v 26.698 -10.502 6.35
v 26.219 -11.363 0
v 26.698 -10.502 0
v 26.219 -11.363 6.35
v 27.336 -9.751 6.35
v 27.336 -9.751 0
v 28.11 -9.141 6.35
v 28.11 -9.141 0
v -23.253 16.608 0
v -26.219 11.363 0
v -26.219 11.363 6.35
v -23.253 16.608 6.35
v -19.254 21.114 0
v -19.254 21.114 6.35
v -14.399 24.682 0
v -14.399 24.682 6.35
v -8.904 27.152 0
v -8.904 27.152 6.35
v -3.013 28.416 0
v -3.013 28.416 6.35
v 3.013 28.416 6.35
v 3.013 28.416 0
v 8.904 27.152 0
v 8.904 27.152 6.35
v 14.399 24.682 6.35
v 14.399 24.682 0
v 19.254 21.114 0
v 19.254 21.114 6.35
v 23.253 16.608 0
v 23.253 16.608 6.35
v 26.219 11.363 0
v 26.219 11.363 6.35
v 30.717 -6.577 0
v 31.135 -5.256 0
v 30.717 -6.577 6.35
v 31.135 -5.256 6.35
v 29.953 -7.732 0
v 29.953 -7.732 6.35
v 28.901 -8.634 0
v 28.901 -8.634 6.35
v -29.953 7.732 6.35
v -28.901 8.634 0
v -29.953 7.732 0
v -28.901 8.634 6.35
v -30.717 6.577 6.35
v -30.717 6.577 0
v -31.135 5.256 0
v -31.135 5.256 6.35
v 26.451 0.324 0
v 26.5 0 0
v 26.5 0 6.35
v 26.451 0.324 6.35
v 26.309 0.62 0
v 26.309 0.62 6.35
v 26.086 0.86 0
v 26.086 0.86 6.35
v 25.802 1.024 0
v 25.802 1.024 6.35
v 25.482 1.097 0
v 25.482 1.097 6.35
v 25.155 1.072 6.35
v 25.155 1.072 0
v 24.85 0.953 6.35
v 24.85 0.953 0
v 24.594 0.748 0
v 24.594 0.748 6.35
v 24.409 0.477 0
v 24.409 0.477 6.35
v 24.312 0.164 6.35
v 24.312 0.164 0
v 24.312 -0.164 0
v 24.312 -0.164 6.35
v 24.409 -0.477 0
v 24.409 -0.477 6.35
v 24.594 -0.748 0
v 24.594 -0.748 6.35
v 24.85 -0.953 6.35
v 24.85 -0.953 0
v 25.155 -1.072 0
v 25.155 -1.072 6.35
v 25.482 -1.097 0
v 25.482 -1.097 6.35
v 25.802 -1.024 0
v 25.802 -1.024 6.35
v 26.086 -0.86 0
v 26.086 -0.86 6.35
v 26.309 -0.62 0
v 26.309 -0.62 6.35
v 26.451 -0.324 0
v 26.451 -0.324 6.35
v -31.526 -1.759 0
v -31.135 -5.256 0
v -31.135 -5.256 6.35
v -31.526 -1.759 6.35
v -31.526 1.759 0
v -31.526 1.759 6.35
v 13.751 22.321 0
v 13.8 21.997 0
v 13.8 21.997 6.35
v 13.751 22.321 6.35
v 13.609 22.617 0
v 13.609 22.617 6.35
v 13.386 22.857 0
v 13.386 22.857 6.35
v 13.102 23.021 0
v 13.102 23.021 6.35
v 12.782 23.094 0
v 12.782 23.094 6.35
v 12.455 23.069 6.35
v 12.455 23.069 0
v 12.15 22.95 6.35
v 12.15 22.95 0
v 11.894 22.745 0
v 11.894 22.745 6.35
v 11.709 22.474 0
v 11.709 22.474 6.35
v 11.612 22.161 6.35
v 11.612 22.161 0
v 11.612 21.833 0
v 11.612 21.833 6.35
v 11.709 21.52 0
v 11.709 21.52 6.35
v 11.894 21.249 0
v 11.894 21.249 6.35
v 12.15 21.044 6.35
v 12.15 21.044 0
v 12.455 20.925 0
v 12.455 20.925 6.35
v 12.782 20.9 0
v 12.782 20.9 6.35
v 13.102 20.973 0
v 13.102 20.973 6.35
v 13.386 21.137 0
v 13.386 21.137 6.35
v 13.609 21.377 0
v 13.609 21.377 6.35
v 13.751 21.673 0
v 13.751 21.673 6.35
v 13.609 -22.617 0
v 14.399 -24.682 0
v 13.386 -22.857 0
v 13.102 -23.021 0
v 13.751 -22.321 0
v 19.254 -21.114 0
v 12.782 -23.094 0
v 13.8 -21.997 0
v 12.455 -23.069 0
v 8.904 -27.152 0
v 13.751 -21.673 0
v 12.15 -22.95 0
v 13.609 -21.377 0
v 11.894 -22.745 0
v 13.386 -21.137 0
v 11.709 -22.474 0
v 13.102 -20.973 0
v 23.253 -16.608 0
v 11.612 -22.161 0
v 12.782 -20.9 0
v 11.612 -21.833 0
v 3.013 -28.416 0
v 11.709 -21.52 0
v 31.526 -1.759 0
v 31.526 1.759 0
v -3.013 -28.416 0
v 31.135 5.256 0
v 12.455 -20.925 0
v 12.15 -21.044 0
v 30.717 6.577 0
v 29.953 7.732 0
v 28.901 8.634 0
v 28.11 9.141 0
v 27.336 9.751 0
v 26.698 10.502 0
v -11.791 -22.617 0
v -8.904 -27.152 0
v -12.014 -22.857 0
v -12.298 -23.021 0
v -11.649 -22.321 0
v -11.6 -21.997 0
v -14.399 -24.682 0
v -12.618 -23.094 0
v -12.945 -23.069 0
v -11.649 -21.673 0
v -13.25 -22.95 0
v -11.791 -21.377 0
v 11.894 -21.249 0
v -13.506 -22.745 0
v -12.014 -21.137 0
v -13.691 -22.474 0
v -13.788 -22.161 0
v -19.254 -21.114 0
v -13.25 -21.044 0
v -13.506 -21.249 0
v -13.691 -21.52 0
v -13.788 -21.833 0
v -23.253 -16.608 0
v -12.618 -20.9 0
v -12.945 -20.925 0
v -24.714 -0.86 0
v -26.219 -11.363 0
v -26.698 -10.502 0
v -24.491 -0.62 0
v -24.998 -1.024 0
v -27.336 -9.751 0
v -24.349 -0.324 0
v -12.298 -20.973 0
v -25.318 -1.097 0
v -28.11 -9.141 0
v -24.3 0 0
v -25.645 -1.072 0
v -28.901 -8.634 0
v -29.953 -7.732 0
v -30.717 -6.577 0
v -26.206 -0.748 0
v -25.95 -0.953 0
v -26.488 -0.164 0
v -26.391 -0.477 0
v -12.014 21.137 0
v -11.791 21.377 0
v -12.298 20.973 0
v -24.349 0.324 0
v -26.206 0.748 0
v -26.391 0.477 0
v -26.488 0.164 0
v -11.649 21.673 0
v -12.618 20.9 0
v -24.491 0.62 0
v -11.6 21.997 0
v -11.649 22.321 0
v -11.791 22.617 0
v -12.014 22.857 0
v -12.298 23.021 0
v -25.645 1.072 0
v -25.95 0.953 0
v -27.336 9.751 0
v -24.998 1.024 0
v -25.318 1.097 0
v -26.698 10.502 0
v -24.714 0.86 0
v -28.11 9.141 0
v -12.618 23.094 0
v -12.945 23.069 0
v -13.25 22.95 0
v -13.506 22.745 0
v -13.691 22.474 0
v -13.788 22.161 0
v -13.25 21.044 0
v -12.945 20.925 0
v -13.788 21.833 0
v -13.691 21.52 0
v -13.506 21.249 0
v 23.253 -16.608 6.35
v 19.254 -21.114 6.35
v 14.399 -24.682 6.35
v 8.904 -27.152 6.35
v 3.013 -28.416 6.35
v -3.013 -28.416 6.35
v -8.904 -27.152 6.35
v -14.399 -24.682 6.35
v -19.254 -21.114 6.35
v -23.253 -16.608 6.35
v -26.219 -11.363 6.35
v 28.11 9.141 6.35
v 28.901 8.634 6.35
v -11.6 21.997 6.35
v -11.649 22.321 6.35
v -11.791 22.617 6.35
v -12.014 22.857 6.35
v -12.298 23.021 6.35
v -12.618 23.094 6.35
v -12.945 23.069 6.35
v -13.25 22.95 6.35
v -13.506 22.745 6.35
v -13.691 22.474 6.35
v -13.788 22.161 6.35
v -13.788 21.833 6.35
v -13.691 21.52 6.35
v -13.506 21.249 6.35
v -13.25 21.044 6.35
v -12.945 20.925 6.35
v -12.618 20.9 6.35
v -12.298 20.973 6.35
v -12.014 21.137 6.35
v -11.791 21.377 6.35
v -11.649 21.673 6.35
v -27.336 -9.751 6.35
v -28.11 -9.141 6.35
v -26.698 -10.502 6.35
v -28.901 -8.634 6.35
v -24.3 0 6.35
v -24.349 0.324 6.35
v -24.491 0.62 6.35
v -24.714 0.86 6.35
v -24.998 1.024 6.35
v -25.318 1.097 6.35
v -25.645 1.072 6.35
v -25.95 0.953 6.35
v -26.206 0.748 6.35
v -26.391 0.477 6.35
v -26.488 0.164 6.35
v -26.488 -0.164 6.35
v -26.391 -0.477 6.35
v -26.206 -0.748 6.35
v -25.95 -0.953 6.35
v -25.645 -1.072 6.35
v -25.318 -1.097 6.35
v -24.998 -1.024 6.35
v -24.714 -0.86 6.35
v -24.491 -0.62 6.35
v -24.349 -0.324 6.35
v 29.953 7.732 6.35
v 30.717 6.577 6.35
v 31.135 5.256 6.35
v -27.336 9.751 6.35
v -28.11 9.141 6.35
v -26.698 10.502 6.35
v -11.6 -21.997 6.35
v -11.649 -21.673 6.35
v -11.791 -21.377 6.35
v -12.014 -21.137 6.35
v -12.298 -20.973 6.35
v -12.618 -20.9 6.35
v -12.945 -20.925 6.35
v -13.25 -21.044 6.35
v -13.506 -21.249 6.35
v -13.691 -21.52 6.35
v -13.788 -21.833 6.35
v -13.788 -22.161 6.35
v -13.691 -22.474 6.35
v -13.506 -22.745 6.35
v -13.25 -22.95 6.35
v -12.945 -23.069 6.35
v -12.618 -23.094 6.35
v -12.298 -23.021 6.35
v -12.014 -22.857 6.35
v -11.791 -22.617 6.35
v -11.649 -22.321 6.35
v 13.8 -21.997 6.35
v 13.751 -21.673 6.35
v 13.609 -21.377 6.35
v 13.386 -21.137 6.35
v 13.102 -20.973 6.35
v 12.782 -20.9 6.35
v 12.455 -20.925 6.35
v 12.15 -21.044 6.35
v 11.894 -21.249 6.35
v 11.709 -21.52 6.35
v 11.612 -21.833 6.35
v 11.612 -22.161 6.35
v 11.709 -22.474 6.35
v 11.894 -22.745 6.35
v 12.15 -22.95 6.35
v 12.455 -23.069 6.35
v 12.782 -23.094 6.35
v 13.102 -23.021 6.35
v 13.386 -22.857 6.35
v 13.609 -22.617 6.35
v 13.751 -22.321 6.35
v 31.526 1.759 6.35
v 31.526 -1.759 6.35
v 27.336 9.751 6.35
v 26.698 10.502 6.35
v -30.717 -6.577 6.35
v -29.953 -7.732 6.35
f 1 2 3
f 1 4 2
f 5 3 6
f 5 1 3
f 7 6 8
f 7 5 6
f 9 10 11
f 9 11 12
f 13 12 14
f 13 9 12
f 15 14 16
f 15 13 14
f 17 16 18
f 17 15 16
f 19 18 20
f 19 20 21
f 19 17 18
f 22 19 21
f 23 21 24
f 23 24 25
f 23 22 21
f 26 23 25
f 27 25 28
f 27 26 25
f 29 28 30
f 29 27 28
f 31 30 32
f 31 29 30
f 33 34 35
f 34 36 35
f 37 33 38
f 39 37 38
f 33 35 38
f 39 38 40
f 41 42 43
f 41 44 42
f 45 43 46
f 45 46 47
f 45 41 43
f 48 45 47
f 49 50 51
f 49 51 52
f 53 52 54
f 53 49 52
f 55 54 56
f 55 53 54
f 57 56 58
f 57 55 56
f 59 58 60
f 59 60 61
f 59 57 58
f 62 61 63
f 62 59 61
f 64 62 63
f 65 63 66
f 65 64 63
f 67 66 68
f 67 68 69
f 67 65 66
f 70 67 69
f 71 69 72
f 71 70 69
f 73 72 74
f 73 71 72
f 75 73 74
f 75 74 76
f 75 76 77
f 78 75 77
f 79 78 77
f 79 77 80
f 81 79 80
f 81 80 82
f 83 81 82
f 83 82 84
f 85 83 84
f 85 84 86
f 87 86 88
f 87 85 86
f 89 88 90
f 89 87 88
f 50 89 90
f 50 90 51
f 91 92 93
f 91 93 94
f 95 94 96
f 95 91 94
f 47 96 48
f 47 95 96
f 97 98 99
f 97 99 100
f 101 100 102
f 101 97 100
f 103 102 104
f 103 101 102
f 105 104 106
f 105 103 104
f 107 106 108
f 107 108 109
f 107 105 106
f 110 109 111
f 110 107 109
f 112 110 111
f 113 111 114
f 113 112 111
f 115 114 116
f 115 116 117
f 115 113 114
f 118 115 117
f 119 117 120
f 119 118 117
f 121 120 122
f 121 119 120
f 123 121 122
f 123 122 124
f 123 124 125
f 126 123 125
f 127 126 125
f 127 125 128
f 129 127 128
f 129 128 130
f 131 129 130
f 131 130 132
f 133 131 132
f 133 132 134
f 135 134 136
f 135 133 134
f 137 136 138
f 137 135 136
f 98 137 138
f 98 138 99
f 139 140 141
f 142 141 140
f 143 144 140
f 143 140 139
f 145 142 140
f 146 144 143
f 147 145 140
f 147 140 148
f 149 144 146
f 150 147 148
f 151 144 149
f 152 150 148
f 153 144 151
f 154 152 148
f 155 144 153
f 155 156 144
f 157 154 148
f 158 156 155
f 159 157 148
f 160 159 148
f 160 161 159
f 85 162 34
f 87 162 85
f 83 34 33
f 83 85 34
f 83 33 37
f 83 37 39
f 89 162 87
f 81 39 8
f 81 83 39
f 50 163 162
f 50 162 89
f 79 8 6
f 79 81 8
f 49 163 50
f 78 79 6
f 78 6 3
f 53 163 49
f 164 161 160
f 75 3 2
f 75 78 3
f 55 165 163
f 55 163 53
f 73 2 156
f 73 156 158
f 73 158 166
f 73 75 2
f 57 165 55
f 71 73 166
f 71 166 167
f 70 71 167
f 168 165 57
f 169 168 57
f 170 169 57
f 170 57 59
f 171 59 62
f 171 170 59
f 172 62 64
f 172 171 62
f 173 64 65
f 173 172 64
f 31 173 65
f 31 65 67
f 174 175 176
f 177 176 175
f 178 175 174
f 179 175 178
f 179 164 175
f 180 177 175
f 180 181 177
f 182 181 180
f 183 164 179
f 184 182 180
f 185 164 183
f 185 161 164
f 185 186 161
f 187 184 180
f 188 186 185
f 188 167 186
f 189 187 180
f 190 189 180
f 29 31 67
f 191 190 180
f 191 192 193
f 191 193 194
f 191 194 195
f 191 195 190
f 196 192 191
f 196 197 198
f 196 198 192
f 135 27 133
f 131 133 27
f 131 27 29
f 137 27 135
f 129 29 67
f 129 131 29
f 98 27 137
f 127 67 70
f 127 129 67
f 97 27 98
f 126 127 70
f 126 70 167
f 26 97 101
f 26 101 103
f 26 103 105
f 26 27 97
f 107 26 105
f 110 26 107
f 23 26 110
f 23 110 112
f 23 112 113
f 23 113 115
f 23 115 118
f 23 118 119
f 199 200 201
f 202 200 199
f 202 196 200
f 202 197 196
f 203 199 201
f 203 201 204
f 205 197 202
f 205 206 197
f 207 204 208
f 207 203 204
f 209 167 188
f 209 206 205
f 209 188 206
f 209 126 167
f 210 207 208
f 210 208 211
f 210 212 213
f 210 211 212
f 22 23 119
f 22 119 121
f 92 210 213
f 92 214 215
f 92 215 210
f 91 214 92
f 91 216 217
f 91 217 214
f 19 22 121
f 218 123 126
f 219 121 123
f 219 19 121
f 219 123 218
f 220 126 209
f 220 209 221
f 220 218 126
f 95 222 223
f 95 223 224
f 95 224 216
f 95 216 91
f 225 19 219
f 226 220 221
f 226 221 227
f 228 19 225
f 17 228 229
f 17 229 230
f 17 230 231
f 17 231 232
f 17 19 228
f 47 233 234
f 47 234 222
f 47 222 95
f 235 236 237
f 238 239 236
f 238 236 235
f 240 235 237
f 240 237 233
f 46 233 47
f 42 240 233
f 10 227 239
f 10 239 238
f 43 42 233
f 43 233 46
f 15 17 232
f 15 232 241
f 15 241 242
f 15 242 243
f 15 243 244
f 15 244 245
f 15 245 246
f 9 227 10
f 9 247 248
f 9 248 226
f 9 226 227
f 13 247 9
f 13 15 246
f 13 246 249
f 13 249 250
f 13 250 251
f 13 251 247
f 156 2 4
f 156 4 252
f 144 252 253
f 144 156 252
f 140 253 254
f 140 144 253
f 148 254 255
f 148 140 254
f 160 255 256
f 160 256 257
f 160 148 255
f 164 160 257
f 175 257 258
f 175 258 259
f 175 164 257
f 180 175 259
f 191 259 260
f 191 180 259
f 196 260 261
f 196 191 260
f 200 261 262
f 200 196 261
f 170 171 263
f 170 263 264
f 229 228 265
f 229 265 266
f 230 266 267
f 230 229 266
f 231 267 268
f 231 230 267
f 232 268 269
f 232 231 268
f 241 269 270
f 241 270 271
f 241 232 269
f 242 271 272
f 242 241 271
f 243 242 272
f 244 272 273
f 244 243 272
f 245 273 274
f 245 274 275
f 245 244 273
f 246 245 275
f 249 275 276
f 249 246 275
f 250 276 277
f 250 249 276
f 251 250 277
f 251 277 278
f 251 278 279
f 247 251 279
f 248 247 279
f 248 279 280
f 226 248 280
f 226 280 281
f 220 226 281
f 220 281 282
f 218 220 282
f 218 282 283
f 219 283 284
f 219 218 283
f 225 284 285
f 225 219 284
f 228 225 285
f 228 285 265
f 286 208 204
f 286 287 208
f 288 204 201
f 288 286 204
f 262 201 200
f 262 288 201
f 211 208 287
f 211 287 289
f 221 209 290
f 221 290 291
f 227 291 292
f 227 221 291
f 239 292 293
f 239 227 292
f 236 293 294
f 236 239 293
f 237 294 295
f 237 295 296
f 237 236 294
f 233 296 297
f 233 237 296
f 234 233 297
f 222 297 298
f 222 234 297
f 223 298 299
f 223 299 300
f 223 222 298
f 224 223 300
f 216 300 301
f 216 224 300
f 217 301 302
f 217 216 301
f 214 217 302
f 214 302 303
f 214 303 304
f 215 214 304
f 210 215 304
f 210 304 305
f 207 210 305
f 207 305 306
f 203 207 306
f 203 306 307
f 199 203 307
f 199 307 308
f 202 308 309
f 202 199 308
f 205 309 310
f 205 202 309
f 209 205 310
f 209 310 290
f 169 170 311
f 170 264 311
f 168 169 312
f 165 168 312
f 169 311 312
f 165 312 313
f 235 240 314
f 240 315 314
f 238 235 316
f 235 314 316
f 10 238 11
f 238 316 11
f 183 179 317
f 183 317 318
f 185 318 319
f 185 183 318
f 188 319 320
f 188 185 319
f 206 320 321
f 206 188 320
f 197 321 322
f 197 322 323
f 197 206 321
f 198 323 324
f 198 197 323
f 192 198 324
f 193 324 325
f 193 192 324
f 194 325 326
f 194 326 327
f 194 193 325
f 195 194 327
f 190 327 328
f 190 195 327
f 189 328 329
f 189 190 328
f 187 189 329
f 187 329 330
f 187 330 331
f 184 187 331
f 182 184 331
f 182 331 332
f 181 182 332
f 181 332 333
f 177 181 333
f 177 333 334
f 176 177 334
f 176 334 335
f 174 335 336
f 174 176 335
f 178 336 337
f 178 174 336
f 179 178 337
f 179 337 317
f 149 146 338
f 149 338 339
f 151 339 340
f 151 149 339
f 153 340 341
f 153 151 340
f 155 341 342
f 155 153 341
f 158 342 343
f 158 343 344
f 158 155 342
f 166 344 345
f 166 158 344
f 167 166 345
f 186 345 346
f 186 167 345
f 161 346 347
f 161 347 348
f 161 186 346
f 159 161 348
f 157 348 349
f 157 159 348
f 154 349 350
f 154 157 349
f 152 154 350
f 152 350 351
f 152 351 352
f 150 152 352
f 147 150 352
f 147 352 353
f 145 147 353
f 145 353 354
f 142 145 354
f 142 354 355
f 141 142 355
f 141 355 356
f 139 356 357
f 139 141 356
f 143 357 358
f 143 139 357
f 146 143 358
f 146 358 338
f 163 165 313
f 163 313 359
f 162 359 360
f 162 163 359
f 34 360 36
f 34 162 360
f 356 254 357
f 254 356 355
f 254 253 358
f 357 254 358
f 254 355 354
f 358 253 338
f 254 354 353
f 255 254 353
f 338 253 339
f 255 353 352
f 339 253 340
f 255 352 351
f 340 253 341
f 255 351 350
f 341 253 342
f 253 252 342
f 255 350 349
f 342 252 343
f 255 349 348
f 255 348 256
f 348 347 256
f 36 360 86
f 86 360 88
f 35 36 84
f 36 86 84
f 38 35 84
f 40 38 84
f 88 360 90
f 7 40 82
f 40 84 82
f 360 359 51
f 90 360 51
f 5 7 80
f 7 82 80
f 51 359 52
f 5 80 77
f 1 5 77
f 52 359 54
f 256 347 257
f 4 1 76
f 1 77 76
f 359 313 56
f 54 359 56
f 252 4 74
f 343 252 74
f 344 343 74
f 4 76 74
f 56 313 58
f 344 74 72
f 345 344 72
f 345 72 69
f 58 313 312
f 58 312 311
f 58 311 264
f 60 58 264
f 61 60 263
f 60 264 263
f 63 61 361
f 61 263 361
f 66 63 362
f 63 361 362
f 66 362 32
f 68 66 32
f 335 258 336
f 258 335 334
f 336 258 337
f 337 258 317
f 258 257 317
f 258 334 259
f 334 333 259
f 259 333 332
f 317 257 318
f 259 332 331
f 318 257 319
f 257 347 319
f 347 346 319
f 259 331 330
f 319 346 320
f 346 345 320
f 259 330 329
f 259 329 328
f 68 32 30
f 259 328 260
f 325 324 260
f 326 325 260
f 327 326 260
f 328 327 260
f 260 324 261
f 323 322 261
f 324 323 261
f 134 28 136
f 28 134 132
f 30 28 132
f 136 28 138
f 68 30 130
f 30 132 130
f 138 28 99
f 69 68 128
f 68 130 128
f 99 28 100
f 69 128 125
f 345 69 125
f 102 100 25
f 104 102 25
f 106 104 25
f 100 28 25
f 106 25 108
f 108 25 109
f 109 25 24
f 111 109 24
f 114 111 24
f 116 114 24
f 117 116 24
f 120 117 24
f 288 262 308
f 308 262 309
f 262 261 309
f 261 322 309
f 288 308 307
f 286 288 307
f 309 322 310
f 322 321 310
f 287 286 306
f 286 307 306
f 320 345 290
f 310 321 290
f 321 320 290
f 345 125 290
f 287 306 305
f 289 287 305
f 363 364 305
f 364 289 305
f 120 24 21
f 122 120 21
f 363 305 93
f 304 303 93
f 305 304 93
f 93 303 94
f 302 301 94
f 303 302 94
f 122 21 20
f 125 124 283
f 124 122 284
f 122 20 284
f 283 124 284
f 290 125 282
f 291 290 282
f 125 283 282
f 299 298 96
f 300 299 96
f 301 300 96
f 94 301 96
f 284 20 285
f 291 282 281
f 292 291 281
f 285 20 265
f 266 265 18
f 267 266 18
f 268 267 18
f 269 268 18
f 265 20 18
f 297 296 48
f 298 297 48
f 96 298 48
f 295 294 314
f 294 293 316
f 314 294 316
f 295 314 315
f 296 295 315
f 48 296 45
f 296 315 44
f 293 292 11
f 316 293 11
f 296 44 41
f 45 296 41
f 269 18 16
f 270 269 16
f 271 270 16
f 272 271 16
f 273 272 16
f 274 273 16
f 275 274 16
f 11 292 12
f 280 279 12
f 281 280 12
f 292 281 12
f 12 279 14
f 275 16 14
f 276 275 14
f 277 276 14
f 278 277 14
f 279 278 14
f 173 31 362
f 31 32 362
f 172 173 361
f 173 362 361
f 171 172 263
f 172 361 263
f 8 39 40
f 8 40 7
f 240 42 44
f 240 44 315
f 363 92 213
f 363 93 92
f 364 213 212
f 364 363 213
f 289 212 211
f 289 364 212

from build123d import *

# Parameters (mm, degrees)
SKETCH1_R           = 1.1
BOSS_EXTRUDE1_DEPTH = 6.35
FILLET1_R           = 5


with BuildPart() as part:
    # Sketch1 → Boss-Extrude1 (new body)
    with BuildSketch(Plane.XY):
        with BuildLine():
            Line((-30.671332299, 7.5), (-26.768089678, 10))
            ThreePointArc((-26.768089678, 10), (0, 28.575), (26.768089678, 10))
            Line((26.768089678, 10), (30.671332299, 7.5))
            ThreePointArc((30.671332299, 7.5), (31.575, 0), (30.671332299, -7.5))
            Line((30.671332299, -7.5), (26.768089678, -10))
            ThreePointArc((26.768089678, -10), (0, -28.575), (-26.768089678, -10))
            Line((-26.768089678, -10), (-30.671332299, -7.5))
            ThreePointArc((-30.671332299, -7.5), (-31.575, 0), (-30.671332299, 7.5))
        make_face()
        with Locations((-25.4, 0)):
            Circle(SKETCH1_R, mode=Mode.SUBTRACT)
        with Locations((-12.7, 21.997045256)):
            Circle(SKETCH1_R, mode=Mode.SUBTRACT)
        with Locations((12.7, 21.997045256)):
            Circle(SKETCH1_R, mode=Mode.SUBTRACT)
        with Locations((25.4, 0)):
            Circle(SKETCH1_R, mode=Mode.SUBTRACT)
        with Locations((12.7, -21.997045256)):
            Circle(SKETCH1_R, mode=Mode.SUBTRACT)
        with Locations((-12.7, -21.997045256)):
            Circle(SKETCH1_R, mode=Mode.SUBTRACT)
    extrude(amount=BOSS_EXTRUDE1_DEPTH)

    # Fillet1
    fillet1_edges = [part.edges().sort_by_distance(p)[0] for p in [
        (30.671332299, -7.5, 3.175),
        (26.768089678, -10, 3.175),
        (-26.768089678, -10, 3.175),
        (-30.671332299, -7.5, 3.175),
        (-30.671332299, 7.5, 3.175),
        (-26.768089678, 10, 3.175),
        (26.768089678, 10, 3.175),
        (30.671332299, 7.5, 3.175),
    ]]
    fillet(fillet1_edges, radius=FILLET1_R)


solid = part.part
